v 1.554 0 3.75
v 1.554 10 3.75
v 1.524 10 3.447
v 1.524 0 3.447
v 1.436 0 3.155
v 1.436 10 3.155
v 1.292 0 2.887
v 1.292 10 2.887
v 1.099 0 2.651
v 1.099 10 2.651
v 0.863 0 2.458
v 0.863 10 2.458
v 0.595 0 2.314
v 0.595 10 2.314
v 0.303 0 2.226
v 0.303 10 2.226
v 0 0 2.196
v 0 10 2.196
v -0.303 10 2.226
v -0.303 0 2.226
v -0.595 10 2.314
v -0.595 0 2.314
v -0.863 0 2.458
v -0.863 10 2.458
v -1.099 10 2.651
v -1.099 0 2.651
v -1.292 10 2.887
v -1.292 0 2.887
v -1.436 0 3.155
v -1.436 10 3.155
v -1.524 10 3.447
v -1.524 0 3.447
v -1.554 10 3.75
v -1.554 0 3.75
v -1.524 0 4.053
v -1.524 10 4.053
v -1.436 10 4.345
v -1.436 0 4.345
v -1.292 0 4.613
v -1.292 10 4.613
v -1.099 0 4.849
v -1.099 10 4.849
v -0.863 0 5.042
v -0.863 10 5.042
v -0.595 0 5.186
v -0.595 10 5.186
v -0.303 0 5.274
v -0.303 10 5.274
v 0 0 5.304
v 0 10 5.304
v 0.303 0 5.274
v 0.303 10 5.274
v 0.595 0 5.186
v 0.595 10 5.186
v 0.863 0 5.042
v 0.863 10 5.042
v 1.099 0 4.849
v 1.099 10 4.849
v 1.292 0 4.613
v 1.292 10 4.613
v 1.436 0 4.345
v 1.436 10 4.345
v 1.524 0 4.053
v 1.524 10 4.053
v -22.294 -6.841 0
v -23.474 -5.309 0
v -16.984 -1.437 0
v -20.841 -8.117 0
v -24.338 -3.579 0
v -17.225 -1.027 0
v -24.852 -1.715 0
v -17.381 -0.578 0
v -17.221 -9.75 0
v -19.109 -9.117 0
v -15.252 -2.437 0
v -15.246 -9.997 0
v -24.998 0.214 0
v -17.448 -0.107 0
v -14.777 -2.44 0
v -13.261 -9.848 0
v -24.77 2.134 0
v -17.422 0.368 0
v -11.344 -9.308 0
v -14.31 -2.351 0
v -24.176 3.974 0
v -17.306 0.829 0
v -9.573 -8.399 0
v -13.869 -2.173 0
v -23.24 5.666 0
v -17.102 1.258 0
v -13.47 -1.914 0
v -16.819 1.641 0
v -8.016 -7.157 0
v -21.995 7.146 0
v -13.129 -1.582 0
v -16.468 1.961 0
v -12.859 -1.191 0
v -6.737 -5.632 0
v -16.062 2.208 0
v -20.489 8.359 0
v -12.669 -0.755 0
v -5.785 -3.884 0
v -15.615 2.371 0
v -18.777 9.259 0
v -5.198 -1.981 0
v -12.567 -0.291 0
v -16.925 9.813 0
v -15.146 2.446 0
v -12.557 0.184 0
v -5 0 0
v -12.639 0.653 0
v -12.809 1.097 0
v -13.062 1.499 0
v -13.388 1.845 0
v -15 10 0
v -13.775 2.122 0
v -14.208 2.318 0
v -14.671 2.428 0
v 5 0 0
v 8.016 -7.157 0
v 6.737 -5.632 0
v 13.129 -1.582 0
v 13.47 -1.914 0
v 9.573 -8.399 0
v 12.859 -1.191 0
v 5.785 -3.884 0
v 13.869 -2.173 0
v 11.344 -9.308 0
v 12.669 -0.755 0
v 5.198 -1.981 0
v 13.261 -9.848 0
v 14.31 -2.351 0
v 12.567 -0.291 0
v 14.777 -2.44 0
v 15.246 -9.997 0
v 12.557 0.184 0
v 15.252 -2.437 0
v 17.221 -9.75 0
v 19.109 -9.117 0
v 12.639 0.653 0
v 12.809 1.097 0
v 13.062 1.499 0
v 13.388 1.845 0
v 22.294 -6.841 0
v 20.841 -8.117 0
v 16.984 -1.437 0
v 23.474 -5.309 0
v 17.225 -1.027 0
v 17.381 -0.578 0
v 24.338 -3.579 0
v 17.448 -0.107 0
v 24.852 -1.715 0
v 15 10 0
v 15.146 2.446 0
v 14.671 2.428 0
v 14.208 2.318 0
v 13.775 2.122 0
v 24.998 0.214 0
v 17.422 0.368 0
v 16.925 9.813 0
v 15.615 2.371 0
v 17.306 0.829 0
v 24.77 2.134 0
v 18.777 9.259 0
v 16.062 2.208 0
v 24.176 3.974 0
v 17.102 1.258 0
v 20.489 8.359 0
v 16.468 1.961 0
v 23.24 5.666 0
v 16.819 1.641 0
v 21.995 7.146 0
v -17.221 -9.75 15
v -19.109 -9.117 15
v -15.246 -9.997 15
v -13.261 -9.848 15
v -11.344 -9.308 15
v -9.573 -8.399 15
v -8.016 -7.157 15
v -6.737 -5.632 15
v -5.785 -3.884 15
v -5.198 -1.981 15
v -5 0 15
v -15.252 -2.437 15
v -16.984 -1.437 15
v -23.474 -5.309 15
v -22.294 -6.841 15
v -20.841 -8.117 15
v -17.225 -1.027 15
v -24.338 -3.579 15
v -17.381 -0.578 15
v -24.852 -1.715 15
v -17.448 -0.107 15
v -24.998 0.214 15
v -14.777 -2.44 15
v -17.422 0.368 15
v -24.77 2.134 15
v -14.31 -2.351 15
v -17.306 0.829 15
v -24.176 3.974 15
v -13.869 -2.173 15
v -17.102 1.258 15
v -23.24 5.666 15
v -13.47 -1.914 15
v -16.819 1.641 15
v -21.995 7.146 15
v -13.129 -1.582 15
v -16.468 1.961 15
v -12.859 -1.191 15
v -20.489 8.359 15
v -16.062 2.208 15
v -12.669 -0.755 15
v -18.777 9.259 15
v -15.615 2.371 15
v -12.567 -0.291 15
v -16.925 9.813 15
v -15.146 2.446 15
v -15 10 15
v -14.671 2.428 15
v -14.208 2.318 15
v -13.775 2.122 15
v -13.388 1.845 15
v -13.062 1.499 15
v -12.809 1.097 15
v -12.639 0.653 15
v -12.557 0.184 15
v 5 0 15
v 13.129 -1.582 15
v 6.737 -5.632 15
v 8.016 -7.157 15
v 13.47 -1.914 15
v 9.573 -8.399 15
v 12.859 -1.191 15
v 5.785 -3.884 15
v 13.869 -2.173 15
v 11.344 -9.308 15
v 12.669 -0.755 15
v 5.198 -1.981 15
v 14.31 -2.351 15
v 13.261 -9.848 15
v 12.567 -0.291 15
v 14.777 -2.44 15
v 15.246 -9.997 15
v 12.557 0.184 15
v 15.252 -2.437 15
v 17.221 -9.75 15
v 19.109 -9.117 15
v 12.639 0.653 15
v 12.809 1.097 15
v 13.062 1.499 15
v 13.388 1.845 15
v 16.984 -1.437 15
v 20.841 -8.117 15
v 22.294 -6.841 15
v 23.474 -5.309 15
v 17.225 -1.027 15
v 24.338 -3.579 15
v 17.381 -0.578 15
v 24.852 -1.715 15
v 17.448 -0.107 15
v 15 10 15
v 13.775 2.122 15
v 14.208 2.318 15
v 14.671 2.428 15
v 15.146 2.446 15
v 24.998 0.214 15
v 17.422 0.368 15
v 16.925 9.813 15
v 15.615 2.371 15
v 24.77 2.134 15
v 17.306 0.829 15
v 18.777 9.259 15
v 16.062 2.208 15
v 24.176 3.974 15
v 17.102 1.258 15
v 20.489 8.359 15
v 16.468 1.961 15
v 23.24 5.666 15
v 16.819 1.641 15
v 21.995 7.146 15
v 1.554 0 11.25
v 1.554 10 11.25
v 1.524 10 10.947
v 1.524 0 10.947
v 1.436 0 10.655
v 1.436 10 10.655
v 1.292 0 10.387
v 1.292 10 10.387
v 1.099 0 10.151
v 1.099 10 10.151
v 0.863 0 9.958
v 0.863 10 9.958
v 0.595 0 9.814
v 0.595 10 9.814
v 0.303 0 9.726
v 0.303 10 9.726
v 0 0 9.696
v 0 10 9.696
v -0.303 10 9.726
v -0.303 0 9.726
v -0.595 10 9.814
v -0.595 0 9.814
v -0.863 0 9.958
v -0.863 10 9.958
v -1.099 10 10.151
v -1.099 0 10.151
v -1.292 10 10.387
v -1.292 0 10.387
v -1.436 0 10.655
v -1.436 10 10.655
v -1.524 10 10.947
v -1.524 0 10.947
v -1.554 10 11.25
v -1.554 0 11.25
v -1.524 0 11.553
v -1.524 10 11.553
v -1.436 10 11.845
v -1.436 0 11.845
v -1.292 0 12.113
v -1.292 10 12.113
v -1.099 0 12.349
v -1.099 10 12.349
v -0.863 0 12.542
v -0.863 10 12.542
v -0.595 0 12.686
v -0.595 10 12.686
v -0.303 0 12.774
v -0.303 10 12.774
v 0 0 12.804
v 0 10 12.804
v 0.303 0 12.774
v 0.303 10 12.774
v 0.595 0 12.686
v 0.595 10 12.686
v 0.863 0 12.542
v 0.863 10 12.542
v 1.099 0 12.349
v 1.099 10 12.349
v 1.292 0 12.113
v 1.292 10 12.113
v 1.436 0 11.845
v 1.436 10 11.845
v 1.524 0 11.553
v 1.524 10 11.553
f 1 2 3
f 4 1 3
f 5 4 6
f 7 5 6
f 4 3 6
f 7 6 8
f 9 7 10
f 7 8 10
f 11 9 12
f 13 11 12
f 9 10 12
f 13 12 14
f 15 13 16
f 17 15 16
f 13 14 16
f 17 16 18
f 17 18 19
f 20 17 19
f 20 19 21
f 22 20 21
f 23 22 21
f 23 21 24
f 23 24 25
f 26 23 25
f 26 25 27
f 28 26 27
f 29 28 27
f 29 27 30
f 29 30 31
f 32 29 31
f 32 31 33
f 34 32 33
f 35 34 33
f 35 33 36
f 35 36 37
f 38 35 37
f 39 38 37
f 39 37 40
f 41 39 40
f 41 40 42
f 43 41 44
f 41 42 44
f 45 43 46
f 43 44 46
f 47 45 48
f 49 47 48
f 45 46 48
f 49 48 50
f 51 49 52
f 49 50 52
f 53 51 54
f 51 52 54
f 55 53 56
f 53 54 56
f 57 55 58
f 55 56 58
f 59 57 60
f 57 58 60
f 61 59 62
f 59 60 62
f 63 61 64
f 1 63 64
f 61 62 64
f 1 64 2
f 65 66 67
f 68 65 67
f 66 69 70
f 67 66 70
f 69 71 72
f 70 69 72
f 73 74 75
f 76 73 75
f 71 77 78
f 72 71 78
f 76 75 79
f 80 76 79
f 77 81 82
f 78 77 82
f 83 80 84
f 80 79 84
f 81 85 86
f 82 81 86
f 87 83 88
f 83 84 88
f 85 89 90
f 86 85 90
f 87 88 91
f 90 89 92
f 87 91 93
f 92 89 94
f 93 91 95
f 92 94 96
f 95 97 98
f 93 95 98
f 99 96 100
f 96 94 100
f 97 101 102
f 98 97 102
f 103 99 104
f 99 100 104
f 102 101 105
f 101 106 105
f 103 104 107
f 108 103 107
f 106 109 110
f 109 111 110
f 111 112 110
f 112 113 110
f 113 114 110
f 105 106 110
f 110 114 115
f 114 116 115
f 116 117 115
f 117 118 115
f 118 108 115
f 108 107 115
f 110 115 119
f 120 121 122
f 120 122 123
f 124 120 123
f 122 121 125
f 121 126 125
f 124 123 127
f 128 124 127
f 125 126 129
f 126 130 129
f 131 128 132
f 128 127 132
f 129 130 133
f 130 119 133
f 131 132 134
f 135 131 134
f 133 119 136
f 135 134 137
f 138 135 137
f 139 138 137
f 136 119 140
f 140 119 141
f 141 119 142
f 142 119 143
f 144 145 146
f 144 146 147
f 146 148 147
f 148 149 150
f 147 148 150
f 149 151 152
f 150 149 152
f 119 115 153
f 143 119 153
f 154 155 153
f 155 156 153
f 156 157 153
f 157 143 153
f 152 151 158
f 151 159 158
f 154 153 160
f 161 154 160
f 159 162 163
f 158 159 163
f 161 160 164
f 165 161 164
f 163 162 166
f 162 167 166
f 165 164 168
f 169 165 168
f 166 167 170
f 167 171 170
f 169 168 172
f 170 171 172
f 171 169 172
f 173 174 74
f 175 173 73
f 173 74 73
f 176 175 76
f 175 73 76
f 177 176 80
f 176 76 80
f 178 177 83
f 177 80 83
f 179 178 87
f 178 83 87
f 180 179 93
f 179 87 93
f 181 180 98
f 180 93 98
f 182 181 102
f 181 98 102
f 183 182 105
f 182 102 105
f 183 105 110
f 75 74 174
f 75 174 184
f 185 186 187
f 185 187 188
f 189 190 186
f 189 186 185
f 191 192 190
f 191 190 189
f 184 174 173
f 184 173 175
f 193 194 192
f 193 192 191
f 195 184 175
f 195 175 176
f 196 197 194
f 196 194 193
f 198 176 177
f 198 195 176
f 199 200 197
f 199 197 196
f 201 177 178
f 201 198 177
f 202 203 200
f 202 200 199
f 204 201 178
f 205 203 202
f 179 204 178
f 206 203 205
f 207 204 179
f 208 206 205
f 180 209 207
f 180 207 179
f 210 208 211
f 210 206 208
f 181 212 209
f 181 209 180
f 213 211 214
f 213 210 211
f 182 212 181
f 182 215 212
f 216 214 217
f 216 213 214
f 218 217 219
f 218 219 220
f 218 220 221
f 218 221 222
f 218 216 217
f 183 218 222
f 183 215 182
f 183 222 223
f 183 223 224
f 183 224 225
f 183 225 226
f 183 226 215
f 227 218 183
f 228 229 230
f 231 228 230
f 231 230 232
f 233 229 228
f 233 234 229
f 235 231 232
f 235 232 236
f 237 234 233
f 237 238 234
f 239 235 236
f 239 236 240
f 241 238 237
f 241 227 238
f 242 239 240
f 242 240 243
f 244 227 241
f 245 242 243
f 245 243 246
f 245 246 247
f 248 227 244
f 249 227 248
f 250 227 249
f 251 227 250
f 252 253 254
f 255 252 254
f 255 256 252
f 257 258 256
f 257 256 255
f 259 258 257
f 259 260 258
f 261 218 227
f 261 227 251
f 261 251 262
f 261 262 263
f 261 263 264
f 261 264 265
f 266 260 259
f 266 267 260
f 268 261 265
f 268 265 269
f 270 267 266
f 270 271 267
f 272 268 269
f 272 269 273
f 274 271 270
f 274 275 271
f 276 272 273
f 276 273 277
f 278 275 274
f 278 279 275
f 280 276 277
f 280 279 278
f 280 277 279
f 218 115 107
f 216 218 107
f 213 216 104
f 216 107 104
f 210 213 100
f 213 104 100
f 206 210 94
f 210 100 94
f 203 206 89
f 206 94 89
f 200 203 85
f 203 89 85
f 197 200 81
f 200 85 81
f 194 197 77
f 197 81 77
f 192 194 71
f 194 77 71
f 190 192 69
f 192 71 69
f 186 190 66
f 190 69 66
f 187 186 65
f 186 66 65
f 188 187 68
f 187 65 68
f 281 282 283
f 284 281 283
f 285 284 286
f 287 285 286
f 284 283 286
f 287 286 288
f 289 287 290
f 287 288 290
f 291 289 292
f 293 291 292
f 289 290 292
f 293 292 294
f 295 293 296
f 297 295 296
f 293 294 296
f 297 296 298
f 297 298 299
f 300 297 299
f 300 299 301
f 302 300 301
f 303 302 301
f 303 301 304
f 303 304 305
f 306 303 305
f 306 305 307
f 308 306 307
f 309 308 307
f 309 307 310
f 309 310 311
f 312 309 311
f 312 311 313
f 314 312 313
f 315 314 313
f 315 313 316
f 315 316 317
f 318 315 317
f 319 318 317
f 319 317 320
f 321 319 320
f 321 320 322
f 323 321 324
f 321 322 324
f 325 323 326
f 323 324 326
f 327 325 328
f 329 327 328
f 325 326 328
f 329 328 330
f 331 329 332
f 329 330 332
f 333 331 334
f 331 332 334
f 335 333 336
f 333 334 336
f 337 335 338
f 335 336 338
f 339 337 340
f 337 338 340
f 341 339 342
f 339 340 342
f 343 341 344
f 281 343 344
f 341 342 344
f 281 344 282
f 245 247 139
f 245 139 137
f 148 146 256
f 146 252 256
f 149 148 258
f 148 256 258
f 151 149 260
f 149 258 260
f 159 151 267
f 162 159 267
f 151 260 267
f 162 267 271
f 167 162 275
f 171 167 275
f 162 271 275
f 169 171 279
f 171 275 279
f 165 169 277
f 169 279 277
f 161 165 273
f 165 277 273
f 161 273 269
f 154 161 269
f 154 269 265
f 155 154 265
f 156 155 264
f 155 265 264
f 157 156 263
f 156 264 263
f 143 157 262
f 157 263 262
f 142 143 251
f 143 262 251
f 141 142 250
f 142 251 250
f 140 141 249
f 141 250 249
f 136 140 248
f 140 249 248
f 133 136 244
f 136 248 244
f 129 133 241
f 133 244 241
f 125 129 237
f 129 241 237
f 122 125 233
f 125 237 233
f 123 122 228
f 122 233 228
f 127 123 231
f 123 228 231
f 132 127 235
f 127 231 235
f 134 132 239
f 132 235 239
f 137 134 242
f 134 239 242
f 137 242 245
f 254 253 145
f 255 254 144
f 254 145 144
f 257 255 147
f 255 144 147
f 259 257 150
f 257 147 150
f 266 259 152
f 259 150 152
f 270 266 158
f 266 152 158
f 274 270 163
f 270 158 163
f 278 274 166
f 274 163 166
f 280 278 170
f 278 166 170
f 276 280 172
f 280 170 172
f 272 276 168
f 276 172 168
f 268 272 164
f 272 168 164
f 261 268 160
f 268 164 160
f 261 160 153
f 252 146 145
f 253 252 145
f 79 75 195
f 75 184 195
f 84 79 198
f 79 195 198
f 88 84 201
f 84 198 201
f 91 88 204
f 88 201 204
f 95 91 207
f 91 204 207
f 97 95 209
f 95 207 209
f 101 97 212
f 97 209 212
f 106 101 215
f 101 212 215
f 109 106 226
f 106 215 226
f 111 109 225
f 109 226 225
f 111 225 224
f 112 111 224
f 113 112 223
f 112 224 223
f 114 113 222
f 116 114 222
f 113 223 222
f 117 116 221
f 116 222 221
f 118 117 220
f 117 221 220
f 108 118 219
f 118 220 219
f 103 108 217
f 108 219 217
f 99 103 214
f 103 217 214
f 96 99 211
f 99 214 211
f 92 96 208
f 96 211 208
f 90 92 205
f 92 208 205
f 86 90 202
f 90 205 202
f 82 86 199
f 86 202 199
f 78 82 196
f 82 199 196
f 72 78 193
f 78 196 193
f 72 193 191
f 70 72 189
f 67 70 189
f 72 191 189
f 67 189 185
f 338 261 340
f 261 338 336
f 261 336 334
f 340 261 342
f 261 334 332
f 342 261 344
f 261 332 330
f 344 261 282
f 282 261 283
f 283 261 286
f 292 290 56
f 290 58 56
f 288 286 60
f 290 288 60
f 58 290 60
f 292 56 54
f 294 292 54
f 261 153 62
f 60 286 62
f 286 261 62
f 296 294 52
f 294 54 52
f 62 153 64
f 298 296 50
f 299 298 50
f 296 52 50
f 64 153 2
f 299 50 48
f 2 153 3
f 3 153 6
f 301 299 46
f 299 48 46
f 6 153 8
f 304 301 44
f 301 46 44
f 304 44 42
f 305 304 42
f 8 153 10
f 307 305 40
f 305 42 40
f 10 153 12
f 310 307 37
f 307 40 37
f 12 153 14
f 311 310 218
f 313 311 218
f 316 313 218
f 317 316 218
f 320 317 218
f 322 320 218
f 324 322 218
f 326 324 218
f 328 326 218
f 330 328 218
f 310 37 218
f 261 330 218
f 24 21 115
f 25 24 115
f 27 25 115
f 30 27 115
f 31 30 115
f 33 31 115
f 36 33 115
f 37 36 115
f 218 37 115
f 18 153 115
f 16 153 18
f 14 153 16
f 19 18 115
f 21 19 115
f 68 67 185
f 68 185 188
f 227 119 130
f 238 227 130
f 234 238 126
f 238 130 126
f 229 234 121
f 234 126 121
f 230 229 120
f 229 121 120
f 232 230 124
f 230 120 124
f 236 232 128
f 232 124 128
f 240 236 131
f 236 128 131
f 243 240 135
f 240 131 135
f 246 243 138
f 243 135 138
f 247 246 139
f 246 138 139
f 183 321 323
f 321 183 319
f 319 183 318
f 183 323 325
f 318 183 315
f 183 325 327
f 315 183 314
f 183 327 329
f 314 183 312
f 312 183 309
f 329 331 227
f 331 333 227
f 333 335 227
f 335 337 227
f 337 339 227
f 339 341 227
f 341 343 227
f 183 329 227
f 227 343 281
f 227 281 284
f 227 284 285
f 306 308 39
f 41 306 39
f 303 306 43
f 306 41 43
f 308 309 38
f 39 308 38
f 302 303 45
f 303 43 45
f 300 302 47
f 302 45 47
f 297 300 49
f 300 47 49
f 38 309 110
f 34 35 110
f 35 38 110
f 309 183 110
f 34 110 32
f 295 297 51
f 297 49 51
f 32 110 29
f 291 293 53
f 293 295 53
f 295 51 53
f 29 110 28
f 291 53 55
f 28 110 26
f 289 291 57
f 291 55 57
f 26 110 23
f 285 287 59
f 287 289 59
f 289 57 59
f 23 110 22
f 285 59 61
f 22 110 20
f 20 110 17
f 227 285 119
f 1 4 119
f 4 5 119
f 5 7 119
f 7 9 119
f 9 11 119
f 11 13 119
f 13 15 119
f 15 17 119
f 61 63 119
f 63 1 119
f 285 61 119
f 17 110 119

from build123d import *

# Parameters (mm, degrees)
BOSS_EXTRUDE1_DEPTH             = 15
SKETCH3_R                       = 2.45
CUT_EXTRUDE1_DEPTH              = 31.822070015
CUT_EXTRUDE2_DEPTH              = 31.822070015
F_3_0MM_CLEARANCE_DOWEL_HOLE1_D = 3.108


with BuildPart() as part:
    # Sketch2 → Boss-Extrude1 (new body)
    with BuildSketch(Plane.XY):
        with BuildLine():
            Line((-5, 10), (-15, 10))
            ThreePointArc((-15, 10), (-22.071067812, -7.071067812), (-5, 0))
            Line((-5, 0), (5, 0))
            ThreePointArc((5, 0), (22.071067812, -7.071067812), (15, 10))
            Line((15, 10), (5, 10))
            Line((5, 10), (-5, 10))
        make_face()
    extrude(amount=BOSS_EXTRUDE1_DEPTH)

    # Sketch3 → Cut-Extrude1 (cut, through all)
    with BuildSketch(Plane.XY.offset(15)):
        with Locations((-15, 0)):
            Circle(SKETCH3_R)
        with Locations((15, 0)):
            Circle(SKETCH3_R)
    extrude(amount=-CUT_EXTRUDE1_DEPTH, mode=Mode.SUBTRACT)

    # Sketch4 → Cut-Extrude2 (cut, through all)
    with BuildSketch(Plane.XY.offset(15)):
        Polygon((-14.133974596, -0.5), (-15.866025404, 0.5), (-20.866025404, -8.160254038), (-19.133974596, -9.160254038), align=None)
        Polygon((14.133974596, -0.5), (15.866025404, 0.5), (20.866025404, -8.160254038), (19.133974596, -9.160254038), align=None)
    extrude(amount=-CUT_EXTRUDE2_DEPTH, mode=Mode.SUBTRACT)

    # Ø3.0mm Clearance Dowel Hole1 (through all)
    with Locations(Plane(origin=(0, 0, 0), x_dir=(-1, 0, 0), z_dir=(0, -1, 0))):
        with Locations((0, -3.75), (0, -11.25)):
            Hole(F_3_0MM_CLEARANCE_DOWEL_HOLE1_D / 2)


solid = part.part
